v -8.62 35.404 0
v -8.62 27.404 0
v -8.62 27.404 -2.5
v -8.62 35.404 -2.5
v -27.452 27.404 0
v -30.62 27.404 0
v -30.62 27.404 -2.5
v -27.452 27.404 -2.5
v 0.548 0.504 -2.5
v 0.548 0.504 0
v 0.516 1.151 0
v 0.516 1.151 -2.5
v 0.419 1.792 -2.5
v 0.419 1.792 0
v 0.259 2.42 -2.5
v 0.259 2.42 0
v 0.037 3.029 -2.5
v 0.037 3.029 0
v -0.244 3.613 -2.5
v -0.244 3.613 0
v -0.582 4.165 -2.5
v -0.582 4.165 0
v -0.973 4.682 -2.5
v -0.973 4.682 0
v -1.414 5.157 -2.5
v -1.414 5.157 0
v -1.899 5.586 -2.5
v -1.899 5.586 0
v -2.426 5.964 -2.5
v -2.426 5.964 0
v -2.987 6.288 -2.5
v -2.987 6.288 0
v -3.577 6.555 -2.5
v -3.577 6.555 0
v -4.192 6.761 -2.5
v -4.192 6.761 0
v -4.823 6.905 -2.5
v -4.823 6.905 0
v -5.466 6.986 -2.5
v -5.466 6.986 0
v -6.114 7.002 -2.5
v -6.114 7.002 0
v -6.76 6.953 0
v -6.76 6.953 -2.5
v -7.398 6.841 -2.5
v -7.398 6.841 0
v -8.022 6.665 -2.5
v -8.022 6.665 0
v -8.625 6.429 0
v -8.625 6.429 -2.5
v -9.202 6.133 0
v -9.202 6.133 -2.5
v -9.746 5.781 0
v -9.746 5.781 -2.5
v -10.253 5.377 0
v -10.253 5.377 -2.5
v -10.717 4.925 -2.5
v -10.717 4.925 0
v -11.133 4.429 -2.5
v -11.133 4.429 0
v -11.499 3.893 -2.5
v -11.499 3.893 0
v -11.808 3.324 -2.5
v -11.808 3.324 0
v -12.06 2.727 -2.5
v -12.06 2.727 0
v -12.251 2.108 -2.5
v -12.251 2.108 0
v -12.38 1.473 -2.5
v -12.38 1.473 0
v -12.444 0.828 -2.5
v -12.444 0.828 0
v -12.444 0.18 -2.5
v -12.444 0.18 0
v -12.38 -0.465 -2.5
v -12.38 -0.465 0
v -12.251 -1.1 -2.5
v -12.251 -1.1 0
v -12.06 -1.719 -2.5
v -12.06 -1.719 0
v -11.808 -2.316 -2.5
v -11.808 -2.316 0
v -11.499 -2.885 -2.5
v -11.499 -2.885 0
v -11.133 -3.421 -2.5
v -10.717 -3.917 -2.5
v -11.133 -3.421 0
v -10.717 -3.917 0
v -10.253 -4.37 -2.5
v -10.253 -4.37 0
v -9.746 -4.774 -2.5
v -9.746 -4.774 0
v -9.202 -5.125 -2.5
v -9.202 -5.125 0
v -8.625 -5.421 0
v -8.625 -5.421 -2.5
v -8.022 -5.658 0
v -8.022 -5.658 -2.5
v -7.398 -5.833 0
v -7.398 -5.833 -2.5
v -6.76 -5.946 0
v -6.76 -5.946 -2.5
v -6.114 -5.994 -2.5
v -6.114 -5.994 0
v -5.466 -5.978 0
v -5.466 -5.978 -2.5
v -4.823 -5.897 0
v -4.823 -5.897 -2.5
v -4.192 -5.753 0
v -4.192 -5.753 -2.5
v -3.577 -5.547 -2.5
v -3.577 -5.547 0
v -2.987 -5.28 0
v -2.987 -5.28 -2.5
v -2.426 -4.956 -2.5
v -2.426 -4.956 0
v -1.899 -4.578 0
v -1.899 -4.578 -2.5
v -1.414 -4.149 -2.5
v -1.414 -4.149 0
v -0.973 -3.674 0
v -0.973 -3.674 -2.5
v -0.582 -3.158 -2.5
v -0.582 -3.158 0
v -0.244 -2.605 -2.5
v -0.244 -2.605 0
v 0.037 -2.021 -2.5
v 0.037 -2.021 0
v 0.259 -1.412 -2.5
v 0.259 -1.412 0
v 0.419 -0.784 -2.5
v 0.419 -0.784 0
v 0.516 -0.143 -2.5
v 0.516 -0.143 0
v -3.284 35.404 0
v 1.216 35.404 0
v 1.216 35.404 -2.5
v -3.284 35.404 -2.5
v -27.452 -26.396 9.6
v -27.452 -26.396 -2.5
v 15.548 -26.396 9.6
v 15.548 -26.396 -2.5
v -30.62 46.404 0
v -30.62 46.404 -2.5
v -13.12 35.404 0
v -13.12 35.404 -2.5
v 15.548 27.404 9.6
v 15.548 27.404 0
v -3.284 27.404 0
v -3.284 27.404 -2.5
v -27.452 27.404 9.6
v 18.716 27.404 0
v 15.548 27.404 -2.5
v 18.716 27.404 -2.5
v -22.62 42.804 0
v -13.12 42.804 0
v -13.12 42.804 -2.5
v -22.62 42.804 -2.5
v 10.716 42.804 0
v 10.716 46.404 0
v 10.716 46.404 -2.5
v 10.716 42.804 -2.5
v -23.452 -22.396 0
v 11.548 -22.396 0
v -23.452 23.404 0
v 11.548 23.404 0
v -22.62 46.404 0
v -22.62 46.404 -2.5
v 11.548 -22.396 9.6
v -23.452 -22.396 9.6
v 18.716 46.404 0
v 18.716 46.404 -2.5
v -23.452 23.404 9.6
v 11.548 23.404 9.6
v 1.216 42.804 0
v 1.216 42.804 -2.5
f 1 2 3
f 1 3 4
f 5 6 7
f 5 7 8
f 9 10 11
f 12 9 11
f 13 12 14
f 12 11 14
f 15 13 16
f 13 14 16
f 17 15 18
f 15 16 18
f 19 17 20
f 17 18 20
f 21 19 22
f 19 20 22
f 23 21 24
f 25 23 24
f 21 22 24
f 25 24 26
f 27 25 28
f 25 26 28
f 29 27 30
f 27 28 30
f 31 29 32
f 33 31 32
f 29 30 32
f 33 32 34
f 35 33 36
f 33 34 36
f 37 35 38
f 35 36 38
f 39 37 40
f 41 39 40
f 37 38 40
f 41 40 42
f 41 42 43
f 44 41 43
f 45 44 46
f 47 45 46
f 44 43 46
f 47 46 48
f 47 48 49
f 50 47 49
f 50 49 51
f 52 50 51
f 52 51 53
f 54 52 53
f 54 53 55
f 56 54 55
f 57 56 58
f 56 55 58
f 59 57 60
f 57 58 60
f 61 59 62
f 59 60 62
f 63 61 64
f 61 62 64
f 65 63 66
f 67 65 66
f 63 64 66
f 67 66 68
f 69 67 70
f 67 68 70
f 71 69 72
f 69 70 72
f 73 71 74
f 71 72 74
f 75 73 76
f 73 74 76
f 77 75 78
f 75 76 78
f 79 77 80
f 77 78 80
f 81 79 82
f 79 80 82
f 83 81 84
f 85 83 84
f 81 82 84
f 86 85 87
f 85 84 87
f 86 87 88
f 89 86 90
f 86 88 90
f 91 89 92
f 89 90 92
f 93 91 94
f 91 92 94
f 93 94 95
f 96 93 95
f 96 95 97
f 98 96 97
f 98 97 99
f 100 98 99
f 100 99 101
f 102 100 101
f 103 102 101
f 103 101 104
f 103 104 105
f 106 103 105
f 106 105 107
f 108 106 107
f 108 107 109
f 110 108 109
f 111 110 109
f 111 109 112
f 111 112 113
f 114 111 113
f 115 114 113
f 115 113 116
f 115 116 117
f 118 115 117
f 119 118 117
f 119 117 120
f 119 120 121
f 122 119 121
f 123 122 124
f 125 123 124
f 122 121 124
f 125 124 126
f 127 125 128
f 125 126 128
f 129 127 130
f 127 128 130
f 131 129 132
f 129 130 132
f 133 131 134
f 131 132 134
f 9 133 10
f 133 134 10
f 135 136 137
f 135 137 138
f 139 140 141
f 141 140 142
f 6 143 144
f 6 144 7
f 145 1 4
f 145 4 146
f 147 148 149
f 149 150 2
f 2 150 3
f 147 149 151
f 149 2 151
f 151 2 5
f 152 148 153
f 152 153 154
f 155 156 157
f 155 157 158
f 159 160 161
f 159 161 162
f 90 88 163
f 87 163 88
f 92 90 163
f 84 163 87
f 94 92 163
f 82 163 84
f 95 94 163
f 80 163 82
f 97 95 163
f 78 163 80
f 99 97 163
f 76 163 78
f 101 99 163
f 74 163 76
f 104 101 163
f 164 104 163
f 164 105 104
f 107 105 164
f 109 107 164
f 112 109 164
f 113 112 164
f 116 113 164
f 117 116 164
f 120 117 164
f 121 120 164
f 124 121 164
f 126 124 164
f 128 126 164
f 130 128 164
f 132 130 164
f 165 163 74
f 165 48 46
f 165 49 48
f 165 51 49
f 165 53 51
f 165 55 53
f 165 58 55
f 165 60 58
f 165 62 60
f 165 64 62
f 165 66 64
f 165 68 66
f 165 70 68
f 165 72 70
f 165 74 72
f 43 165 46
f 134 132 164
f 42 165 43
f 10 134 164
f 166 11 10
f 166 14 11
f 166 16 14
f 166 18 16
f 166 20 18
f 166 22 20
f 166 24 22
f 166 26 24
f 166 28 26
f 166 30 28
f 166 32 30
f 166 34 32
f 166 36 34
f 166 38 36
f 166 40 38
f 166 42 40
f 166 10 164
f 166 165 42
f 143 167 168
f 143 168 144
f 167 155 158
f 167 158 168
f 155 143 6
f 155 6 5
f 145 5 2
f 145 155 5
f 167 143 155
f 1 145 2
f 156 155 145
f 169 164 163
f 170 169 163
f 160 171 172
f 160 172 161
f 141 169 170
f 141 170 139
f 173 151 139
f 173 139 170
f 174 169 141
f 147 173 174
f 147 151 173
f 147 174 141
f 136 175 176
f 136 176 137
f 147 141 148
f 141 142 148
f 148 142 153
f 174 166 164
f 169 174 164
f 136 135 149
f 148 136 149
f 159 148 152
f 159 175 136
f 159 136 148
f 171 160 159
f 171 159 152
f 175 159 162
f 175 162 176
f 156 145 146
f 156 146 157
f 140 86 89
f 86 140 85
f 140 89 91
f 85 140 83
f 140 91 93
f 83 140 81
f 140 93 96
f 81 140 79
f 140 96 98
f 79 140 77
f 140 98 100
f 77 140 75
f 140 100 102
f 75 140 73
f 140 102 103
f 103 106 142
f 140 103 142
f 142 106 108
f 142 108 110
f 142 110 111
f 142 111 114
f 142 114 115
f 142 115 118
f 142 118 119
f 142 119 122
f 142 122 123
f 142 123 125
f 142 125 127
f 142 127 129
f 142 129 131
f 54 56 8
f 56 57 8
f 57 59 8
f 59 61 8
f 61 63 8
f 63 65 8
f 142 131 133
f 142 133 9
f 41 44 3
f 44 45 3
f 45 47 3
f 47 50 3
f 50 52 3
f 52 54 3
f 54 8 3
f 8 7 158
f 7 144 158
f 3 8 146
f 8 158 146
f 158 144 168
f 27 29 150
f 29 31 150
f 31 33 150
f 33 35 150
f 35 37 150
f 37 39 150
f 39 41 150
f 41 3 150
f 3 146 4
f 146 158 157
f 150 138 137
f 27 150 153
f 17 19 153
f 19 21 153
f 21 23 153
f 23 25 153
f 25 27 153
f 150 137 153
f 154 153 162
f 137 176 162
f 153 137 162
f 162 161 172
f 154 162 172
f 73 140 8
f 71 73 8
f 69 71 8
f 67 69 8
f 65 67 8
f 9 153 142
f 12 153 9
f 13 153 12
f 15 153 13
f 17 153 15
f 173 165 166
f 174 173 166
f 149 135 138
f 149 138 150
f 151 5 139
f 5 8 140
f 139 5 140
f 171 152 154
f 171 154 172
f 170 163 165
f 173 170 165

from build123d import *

# Parameters (mm, degrees)
F0_R     = 6.5
F1_DEPTH = 2.5
F3_DEPTH = 9.6


# Not quite as in the source:
# - a feature of the source that left no trace in its solid (it failed there, or was rolled back) is left out


with BuildPart() as f1:
    # F0 (on Top) → F1 (new body)
    with BuildSketch(Plane.XY):
        Polygon((-30.6198447943, 27.4039022624), (-27.4521095872, 27.4039022624), (-8.6198447943, 27.4039022624), (-8.6198447943, 35.4039022624), (-13.1198447943, 35.4039022624), (-13.1198447943, 42.8039022624), (-22.6198447943, 42.8039022624), (-22.6198447943, 46.4039022624), (-30.6198447943, 46.4039022624), align=None)
        Polygon((-3.2843746781, 35.4039022624), (-3.2843746781, 27.4039022624), (15.5478901148, 27.4039022624), (18.7156253219, 27.4039022624), (18.7156253219, 46.4039022624), (10.7156253219, 46.4039022624), (10.7156253219, 42.8039022624), (1.2156253219, 42.8039022624), (1.2156253219, 35.4039022624), align=None)
        Polygon((-8.6198447943, 27.4039022624), (-27.4521095872, 27.4039022624), (-27.4521095872, -26.3960977376), (-6.0521095872, -26.3960977376), (-5.8521098852, -26.3960977376), (15.5478901148, -26.3960977376), (15.5478901148, 27.4039022624), (-3.2843746781, 27.4039022624), (-5.8521098852, 27.4039022624), (-6.0521095872, 27.4039022624), align=None)
        Polygon((-23.4521095872, -22.3960977376), (-23.4521095872, 23.4039022624), (-5.9521097362, 23.4039022624), (11.5478901148, 23.4039022624), (11.5478901148, -22.3960977376), (-5.9521097362, -22.3960977376), align=None, mode=Mode.SUBTRACT)
        Polygon((-5.9521097362, 23.4039022624), (-23.4521095872, 23.4039022624), (-23.4521095872, -22.3960977376), (-5.9521097362, -22.3960977376), (11.5478901148, -22.3960977376), (11.5478901148, 23.4039022624), align=None)
        with Locations((-5.9521097362, 0.5039022624)):
            Circle(F0_R, mode=Mode.SUBTRACT)
    extrude(amount=-F1_DEPTH)

    # F0 (on Top) → F3 (join)
    with BuildSketch(Plane.XY):
        Polygon((-8.6198447943, 27.4039022624), (-27.4521095872, 27.4039022624), (-27.4521095872, -26.3960977376), (-6.0521095872, -26.3960977376), (-5.8521098852, -26.3960977376), (15.5478901148, -26.3960977376), (15.5478901148, 27.4039022624), (-3.2843746781, 27.4039022624), (-5.8521098852, 27.4039022624), (-6.0521095872, 27.4039022624), align=None)
        Polygon((-23.4521095872, -22.3960977376), (-23.4521095872, 23.4039022624), (-5.9521097362, 23.4039022624), (11.5478901148, 23.4039022624), (11.5478901148, -22.3960977376), (-5.9521097362, -22.3960977376), align=None, mode=Mode.SUBTRACT)
    extrude(amount=F3_DEPTH)


solid = f1.part
